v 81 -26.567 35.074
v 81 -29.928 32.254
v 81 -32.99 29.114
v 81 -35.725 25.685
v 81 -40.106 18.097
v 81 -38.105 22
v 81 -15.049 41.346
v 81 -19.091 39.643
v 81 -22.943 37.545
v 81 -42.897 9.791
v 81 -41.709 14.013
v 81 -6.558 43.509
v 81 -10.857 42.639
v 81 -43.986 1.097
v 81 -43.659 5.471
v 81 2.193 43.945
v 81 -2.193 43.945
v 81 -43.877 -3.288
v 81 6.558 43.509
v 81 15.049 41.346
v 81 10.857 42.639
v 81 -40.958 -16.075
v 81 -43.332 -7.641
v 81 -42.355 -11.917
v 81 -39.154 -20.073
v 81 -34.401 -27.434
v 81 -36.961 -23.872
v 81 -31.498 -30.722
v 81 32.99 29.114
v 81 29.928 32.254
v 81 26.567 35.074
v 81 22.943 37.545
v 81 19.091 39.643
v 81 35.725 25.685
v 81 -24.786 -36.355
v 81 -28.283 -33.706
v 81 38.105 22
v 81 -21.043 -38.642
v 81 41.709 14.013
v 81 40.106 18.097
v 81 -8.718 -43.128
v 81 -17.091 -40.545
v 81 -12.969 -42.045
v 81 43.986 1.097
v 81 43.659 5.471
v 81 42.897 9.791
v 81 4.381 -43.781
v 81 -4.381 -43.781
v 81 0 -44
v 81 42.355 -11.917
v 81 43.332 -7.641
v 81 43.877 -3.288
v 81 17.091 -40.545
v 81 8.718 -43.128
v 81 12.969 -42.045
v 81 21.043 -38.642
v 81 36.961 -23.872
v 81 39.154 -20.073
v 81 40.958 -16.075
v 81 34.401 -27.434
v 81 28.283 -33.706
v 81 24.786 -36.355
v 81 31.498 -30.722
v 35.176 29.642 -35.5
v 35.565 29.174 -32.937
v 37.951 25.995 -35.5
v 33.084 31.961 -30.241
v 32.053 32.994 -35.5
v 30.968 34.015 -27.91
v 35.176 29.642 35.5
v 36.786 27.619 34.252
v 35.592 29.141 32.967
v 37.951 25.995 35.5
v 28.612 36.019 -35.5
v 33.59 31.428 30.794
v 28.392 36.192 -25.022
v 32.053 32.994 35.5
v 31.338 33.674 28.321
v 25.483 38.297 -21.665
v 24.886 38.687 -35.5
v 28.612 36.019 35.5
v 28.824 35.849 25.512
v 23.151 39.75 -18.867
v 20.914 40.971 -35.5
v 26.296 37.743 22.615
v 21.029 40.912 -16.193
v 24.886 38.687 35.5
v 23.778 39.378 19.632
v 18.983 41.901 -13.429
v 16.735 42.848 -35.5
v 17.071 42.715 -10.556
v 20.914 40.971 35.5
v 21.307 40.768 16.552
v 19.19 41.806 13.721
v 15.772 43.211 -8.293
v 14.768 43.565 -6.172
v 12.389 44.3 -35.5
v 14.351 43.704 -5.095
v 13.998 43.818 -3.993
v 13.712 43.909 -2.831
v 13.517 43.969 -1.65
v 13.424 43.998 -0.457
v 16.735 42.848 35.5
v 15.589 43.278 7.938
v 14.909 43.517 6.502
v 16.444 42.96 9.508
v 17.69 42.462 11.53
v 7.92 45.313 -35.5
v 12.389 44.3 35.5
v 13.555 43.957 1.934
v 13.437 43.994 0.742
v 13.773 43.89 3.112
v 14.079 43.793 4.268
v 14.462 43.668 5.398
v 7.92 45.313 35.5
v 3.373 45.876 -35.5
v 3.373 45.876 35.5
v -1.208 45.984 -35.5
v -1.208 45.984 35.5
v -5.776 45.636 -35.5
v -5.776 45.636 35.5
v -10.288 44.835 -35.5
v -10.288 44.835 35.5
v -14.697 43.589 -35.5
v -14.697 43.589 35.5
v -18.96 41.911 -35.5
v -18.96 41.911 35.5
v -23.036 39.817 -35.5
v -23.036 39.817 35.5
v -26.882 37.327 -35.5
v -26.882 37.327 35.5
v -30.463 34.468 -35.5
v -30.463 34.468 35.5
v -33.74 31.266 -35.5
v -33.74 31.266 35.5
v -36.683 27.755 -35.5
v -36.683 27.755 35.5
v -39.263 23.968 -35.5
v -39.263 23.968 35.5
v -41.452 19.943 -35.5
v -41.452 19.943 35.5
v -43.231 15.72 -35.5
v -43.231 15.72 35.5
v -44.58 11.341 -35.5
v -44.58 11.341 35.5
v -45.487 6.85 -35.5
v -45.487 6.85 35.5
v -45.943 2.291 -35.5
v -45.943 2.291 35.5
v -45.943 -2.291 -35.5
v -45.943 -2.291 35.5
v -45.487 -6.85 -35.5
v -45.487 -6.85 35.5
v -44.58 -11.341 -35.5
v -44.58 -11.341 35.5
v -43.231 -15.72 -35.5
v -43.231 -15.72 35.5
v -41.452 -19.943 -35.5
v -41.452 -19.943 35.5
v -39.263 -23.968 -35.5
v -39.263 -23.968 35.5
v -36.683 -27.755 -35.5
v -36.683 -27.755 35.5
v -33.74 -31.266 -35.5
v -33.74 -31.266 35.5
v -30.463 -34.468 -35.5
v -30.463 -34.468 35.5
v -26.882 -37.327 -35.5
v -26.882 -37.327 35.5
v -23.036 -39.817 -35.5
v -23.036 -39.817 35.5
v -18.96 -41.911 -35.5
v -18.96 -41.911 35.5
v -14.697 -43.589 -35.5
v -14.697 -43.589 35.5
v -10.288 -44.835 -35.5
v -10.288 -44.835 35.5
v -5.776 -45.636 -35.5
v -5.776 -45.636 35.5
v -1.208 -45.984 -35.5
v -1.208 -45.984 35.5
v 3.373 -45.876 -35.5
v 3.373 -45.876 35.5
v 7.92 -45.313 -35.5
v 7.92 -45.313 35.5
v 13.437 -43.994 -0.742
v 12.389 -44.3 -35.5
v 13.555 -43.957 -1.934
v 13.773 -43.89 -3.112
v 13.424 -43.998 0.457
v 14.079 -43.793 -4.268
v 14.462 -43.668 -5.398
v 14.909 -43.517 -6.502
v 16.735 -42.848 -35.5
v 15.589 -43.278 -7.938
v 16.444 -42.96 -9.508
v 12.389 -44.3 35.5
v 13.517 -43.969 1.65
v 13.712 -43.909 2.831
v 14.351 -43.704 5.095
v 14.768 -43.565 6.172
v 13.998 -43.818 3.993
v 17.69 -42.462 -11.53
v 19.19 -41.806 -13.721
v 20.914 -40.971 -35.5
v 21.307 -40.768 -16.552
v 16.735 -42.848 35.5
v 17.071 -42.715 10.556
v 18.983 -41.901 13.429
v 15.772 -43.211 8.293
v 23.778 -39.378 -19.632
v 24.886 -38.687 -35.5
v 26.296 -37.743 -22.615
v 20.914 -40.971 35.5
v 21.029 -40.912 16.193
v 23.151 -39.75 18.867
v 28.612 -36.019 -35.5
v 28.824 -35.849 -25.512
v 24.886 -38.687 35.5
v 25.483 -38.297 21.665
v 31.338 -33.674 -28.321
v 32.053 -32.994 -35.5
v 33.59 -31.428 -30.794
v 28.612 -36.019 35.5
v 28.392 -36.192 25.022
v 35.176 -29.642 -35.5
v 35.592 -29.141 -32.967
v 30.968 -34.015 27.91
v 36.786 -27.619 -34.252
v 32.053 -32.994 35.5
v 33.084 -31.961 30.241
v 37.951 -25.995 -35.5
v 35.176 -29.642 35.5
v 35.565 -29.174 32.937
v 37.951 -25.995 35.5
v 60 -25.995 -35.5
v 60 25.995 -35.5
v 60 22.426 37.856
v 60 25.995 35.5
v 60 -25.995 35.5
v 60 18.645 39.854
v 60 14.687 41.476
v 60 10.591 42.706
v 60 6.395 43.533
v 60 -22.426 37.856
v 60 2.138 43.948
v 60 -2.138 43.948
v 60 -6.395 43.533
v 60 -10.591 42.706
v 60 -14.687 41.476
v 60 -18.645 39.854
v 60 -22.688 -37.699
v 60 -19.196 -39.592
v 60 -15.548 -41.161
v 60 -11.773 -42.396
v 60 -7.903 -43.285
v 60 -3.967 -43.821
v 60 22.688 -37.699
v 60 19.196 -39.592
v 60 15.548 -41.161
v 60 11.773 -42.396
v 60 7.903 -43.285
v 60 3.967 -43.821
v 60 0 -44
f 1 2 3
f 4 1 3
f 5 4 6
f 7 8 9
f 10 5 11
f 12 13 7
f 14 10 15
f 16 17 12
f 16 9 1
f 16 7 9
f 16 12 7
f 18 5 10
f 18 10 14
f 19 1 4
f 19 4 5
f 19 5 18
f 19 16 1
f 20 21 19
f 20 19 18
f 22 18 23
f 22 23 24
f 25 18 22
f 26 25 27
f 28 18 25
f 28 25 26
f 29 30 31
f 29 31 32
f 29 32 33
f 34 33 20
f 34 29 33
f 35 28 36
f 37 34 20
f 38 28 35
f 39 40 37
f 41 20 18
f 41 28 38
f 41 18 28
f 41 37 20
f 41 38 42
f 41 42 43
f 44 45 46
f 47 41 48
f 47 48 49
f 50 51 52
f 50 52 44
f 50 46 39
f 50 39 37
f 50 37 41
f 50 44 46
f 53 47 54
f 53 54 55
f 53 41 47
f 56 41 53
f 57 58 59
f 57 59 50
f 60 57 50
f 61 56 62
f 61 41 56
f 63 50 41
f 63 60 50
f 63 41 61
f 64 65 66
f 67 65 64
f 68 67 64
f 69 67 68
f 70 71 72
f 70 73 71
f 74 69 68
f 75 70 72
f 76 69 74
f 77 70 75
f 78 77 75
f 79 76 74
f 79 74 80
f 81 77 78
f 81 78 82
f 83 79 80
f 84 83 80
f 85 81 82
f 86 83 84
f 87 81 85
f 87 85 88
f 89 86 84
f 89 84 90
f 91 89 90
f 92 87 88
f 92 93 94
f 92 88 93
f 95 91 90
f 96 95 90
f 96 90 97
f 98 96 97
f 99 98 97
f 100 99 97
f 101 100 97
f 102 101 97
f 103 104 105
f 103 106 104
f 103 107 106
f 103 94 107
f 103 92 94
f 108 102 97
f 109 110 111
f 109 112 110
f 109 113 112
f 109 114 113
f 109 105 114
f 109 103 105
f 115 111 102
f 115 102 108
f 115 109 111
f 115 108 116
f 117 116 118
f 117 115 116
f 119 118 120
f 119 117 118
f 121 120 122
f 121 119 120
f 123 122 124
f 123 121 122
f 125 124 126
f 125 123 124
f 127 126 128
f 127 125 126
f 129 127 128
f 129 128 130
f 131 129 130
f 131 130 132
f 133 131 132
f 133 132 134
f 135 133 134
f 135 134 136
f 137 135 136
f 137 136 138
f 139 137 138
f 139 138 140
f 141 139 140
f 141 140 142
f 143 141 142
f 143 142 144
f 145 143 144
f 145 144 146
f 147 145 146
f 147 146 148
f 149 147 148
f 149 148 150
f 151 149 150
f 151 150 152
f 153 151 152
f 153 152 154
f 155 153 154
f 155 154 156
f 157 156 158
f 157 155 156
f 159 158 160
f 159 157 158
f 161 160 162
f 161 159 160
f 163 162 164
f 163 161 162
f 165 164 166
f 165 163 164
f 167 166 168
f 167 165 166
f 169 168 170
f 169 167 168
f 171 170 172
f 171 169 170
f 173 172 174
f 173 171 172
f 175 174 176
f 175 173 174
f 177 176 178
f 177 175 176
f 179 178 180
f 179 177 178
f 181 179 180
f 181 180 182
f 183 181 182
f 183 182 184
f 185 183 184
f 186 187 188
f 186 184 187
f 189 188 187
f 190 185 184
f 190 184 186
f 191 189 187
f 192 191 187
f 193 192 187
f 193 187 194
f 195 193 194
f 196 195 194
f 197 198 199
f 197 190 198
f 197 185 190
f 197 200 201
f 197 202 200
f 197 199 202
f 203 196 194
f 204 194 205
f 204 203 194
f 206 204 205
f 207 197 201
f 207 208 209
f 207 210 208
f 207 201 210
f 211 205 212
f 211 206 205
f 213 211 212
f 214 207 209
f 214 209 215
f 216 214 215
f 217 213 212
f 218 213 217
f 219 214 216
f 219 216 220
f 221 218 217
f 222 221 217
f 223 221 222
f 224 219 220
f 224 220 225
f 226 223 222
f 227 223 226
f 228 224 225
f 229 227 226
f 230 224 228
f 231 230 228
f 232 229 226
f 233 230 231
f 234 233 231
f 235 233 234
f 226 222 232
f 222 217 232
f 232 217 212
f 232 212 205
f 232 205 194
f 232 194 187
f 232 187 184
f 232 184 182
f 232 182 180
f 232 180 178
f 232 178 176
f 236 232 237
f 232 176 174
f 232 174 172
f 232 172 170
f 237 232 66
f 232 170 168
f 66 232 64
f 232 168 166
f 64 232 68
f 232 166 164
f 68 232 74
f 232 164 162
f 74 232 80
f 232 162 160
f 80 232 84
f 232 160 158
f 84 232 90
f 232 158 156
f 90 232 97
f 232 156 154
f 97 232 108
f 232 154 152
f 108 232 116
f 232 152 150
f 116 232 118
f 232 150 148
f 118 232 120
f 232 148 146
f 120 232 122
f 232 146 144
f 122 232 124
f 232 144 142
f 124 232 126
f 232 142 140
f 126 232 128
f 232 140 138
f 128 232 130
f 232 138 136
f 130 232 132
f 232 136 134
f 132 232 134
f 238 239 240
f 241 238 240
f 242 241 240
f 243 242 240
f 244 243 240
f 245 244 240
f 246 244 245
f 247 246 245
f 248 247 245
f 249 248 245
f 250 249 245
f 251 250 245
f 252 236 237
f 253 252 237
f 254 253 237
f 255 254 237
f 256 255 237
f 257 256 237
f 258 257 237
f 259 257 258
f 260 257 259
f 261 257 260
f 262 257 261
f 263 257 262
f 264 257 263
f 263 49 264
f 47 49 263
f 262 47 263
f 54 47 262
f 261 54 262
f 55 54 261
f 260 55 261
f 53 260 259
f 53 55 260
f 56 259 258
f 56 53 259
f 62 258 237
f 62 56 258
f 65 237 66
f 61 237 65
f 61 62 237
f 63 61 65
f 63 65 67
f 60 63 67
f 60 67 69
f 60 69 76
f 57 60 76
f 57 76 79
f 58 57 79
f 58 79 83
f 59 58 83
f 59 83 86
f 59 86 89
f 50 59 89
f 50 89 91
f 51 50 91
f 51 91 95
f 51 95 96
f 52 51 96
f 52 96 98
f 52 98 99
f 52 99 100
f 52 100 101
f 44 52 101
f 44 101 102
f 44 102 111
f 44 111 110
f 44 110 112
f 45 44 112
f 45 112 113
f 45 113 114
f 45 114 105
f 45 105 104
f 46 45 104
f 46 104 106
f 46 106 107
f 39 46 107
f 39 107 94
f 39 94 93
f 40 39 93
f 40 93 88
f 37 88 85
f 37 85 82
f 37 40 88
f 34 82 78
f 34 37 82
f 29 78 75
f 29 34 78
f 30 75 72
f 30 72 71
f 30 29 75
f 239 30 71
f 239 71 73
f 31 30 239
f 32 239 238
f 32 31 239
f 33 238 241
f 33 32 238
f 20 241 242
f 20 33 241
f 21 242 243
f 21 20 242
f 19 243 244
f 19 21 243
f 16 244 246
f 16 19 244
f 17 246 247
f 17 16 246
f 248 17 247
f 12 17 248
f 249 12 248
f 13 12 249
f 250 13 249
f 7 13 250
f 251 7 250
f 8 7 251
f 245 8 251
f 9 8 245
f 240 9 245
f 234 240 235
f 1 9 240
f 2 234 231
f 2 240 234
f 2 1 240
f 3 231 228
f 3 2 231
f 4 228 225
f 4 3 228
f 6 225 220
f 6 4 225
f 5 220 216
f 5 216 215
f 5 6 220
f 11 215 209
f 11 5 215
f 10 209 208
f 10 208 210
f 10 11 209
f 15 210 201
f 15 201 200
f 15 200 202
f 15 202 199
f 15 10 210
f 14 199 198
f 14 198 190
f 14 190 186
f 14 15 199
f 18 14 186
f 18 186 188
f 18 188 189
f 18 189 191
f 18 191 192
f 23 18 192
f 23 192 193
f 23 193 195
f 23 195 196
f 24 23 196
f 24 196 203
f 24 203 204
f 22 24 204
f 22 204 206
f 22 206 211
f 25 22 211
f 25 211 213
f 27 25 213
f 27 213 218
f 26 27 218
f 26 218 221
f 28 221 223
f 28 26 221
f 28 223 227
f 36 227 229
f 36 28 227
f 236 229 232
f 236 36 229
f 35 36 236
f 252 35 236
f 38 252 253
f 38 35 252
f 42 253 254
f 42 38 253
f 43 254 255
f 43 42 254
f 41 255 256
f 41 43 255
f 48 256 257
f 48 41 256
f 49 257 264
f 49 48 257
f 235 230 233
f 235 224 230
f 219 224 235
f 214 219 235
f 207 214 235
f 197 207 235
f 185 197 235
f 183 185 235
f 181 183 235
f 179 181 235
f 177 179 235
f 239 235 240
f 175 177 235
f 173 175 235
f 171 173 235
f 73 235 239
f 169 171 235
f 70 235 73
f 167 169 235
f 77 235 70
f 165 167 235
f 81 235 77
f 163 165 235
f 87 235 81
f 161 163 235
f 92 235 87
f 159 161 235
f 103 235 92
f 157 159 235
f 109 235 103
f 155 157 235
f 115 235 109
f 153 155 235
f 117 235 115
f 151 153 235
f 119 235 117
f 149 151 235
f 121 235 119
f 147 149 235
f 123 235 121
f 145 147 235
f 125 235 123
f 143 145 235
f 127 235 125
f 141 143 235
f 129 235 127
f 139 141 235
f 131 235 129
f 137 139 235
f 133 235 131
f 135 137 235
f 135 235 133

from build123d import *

# Parameters (mm, degrees)
SKETCH_1_R           = 46
EXTRUDE_1_DEPTH      = 35.5
EXTRUDE_2_REACH      = 141.661
EXTRUDE_2_END_RADIUS = 46
SKETCH_2_R           = 44
SKETCH_3_W           = 10.337073316
SKETCH_3_H           = 61.617049376
SKETCH_3_W_2         = 11.195847523
CUT_EXTRUDE_1_DEPTH  = 60


with BuildPart() as part:
    # 草图1 → 凸台-拉伸1 (new, symmetric)
    with BuildSketch(Plane.XY):
        Circle(SKETCH_1_R)
    extrude(amount=EXTRUDE_1_DEPTH, both=True)

    # 凸台-拉伸2: up to this cylinder (the profile starts outside it)
    extrude_2_end = Plane(origin=(0, 0, 0), z_dir=(0, 0, -1)) * Cylinder(EXTRUDE_2_END_RADIUS, 376.322, mode=Mode.PRIVATE)
    # 草图2 → 凸台-拉伸2 (add, up to the surface)
    with BuildSketch(Plane(origin=(81, 0, 0), x_dir=(0, 0, -1), z_dir=(1, 0, 0)), mode=Mode.PRIVATE) as extrude_2_sk1:
        Circle(SKETCH_2_R)
    extrude_2_tool1 = extrude(extrude_2_sk1.sketch, amount=-EXTRUDE_2_REACH, mode=Mode.PRIVATE) - extrude_2_end
    add(extrude_2_tool1.solids().sort_by_distance((81, 0, 0))[0])

    # 草图3 → 切除-拉伸1 (cut)
    with BuildSketch(Plane(origin=(0, 0, 0), x_dir=(0, 0, -1), z_dir=(1, 0, 0))):
        with Locations((-40.668536658, 1.610201639)):
            Rectangle(SKETCH_3_W, SKETCH_3_H)
        with Locations((41.097923761, 1.610201639)):
            Rectangle(SKETCH_3_W_2, SKETCH_3_H)
    extrude(amount=CUT_EXTRUDE_1_DEPTH, mode=Mode.SUBTRACT)


solid = part.part
